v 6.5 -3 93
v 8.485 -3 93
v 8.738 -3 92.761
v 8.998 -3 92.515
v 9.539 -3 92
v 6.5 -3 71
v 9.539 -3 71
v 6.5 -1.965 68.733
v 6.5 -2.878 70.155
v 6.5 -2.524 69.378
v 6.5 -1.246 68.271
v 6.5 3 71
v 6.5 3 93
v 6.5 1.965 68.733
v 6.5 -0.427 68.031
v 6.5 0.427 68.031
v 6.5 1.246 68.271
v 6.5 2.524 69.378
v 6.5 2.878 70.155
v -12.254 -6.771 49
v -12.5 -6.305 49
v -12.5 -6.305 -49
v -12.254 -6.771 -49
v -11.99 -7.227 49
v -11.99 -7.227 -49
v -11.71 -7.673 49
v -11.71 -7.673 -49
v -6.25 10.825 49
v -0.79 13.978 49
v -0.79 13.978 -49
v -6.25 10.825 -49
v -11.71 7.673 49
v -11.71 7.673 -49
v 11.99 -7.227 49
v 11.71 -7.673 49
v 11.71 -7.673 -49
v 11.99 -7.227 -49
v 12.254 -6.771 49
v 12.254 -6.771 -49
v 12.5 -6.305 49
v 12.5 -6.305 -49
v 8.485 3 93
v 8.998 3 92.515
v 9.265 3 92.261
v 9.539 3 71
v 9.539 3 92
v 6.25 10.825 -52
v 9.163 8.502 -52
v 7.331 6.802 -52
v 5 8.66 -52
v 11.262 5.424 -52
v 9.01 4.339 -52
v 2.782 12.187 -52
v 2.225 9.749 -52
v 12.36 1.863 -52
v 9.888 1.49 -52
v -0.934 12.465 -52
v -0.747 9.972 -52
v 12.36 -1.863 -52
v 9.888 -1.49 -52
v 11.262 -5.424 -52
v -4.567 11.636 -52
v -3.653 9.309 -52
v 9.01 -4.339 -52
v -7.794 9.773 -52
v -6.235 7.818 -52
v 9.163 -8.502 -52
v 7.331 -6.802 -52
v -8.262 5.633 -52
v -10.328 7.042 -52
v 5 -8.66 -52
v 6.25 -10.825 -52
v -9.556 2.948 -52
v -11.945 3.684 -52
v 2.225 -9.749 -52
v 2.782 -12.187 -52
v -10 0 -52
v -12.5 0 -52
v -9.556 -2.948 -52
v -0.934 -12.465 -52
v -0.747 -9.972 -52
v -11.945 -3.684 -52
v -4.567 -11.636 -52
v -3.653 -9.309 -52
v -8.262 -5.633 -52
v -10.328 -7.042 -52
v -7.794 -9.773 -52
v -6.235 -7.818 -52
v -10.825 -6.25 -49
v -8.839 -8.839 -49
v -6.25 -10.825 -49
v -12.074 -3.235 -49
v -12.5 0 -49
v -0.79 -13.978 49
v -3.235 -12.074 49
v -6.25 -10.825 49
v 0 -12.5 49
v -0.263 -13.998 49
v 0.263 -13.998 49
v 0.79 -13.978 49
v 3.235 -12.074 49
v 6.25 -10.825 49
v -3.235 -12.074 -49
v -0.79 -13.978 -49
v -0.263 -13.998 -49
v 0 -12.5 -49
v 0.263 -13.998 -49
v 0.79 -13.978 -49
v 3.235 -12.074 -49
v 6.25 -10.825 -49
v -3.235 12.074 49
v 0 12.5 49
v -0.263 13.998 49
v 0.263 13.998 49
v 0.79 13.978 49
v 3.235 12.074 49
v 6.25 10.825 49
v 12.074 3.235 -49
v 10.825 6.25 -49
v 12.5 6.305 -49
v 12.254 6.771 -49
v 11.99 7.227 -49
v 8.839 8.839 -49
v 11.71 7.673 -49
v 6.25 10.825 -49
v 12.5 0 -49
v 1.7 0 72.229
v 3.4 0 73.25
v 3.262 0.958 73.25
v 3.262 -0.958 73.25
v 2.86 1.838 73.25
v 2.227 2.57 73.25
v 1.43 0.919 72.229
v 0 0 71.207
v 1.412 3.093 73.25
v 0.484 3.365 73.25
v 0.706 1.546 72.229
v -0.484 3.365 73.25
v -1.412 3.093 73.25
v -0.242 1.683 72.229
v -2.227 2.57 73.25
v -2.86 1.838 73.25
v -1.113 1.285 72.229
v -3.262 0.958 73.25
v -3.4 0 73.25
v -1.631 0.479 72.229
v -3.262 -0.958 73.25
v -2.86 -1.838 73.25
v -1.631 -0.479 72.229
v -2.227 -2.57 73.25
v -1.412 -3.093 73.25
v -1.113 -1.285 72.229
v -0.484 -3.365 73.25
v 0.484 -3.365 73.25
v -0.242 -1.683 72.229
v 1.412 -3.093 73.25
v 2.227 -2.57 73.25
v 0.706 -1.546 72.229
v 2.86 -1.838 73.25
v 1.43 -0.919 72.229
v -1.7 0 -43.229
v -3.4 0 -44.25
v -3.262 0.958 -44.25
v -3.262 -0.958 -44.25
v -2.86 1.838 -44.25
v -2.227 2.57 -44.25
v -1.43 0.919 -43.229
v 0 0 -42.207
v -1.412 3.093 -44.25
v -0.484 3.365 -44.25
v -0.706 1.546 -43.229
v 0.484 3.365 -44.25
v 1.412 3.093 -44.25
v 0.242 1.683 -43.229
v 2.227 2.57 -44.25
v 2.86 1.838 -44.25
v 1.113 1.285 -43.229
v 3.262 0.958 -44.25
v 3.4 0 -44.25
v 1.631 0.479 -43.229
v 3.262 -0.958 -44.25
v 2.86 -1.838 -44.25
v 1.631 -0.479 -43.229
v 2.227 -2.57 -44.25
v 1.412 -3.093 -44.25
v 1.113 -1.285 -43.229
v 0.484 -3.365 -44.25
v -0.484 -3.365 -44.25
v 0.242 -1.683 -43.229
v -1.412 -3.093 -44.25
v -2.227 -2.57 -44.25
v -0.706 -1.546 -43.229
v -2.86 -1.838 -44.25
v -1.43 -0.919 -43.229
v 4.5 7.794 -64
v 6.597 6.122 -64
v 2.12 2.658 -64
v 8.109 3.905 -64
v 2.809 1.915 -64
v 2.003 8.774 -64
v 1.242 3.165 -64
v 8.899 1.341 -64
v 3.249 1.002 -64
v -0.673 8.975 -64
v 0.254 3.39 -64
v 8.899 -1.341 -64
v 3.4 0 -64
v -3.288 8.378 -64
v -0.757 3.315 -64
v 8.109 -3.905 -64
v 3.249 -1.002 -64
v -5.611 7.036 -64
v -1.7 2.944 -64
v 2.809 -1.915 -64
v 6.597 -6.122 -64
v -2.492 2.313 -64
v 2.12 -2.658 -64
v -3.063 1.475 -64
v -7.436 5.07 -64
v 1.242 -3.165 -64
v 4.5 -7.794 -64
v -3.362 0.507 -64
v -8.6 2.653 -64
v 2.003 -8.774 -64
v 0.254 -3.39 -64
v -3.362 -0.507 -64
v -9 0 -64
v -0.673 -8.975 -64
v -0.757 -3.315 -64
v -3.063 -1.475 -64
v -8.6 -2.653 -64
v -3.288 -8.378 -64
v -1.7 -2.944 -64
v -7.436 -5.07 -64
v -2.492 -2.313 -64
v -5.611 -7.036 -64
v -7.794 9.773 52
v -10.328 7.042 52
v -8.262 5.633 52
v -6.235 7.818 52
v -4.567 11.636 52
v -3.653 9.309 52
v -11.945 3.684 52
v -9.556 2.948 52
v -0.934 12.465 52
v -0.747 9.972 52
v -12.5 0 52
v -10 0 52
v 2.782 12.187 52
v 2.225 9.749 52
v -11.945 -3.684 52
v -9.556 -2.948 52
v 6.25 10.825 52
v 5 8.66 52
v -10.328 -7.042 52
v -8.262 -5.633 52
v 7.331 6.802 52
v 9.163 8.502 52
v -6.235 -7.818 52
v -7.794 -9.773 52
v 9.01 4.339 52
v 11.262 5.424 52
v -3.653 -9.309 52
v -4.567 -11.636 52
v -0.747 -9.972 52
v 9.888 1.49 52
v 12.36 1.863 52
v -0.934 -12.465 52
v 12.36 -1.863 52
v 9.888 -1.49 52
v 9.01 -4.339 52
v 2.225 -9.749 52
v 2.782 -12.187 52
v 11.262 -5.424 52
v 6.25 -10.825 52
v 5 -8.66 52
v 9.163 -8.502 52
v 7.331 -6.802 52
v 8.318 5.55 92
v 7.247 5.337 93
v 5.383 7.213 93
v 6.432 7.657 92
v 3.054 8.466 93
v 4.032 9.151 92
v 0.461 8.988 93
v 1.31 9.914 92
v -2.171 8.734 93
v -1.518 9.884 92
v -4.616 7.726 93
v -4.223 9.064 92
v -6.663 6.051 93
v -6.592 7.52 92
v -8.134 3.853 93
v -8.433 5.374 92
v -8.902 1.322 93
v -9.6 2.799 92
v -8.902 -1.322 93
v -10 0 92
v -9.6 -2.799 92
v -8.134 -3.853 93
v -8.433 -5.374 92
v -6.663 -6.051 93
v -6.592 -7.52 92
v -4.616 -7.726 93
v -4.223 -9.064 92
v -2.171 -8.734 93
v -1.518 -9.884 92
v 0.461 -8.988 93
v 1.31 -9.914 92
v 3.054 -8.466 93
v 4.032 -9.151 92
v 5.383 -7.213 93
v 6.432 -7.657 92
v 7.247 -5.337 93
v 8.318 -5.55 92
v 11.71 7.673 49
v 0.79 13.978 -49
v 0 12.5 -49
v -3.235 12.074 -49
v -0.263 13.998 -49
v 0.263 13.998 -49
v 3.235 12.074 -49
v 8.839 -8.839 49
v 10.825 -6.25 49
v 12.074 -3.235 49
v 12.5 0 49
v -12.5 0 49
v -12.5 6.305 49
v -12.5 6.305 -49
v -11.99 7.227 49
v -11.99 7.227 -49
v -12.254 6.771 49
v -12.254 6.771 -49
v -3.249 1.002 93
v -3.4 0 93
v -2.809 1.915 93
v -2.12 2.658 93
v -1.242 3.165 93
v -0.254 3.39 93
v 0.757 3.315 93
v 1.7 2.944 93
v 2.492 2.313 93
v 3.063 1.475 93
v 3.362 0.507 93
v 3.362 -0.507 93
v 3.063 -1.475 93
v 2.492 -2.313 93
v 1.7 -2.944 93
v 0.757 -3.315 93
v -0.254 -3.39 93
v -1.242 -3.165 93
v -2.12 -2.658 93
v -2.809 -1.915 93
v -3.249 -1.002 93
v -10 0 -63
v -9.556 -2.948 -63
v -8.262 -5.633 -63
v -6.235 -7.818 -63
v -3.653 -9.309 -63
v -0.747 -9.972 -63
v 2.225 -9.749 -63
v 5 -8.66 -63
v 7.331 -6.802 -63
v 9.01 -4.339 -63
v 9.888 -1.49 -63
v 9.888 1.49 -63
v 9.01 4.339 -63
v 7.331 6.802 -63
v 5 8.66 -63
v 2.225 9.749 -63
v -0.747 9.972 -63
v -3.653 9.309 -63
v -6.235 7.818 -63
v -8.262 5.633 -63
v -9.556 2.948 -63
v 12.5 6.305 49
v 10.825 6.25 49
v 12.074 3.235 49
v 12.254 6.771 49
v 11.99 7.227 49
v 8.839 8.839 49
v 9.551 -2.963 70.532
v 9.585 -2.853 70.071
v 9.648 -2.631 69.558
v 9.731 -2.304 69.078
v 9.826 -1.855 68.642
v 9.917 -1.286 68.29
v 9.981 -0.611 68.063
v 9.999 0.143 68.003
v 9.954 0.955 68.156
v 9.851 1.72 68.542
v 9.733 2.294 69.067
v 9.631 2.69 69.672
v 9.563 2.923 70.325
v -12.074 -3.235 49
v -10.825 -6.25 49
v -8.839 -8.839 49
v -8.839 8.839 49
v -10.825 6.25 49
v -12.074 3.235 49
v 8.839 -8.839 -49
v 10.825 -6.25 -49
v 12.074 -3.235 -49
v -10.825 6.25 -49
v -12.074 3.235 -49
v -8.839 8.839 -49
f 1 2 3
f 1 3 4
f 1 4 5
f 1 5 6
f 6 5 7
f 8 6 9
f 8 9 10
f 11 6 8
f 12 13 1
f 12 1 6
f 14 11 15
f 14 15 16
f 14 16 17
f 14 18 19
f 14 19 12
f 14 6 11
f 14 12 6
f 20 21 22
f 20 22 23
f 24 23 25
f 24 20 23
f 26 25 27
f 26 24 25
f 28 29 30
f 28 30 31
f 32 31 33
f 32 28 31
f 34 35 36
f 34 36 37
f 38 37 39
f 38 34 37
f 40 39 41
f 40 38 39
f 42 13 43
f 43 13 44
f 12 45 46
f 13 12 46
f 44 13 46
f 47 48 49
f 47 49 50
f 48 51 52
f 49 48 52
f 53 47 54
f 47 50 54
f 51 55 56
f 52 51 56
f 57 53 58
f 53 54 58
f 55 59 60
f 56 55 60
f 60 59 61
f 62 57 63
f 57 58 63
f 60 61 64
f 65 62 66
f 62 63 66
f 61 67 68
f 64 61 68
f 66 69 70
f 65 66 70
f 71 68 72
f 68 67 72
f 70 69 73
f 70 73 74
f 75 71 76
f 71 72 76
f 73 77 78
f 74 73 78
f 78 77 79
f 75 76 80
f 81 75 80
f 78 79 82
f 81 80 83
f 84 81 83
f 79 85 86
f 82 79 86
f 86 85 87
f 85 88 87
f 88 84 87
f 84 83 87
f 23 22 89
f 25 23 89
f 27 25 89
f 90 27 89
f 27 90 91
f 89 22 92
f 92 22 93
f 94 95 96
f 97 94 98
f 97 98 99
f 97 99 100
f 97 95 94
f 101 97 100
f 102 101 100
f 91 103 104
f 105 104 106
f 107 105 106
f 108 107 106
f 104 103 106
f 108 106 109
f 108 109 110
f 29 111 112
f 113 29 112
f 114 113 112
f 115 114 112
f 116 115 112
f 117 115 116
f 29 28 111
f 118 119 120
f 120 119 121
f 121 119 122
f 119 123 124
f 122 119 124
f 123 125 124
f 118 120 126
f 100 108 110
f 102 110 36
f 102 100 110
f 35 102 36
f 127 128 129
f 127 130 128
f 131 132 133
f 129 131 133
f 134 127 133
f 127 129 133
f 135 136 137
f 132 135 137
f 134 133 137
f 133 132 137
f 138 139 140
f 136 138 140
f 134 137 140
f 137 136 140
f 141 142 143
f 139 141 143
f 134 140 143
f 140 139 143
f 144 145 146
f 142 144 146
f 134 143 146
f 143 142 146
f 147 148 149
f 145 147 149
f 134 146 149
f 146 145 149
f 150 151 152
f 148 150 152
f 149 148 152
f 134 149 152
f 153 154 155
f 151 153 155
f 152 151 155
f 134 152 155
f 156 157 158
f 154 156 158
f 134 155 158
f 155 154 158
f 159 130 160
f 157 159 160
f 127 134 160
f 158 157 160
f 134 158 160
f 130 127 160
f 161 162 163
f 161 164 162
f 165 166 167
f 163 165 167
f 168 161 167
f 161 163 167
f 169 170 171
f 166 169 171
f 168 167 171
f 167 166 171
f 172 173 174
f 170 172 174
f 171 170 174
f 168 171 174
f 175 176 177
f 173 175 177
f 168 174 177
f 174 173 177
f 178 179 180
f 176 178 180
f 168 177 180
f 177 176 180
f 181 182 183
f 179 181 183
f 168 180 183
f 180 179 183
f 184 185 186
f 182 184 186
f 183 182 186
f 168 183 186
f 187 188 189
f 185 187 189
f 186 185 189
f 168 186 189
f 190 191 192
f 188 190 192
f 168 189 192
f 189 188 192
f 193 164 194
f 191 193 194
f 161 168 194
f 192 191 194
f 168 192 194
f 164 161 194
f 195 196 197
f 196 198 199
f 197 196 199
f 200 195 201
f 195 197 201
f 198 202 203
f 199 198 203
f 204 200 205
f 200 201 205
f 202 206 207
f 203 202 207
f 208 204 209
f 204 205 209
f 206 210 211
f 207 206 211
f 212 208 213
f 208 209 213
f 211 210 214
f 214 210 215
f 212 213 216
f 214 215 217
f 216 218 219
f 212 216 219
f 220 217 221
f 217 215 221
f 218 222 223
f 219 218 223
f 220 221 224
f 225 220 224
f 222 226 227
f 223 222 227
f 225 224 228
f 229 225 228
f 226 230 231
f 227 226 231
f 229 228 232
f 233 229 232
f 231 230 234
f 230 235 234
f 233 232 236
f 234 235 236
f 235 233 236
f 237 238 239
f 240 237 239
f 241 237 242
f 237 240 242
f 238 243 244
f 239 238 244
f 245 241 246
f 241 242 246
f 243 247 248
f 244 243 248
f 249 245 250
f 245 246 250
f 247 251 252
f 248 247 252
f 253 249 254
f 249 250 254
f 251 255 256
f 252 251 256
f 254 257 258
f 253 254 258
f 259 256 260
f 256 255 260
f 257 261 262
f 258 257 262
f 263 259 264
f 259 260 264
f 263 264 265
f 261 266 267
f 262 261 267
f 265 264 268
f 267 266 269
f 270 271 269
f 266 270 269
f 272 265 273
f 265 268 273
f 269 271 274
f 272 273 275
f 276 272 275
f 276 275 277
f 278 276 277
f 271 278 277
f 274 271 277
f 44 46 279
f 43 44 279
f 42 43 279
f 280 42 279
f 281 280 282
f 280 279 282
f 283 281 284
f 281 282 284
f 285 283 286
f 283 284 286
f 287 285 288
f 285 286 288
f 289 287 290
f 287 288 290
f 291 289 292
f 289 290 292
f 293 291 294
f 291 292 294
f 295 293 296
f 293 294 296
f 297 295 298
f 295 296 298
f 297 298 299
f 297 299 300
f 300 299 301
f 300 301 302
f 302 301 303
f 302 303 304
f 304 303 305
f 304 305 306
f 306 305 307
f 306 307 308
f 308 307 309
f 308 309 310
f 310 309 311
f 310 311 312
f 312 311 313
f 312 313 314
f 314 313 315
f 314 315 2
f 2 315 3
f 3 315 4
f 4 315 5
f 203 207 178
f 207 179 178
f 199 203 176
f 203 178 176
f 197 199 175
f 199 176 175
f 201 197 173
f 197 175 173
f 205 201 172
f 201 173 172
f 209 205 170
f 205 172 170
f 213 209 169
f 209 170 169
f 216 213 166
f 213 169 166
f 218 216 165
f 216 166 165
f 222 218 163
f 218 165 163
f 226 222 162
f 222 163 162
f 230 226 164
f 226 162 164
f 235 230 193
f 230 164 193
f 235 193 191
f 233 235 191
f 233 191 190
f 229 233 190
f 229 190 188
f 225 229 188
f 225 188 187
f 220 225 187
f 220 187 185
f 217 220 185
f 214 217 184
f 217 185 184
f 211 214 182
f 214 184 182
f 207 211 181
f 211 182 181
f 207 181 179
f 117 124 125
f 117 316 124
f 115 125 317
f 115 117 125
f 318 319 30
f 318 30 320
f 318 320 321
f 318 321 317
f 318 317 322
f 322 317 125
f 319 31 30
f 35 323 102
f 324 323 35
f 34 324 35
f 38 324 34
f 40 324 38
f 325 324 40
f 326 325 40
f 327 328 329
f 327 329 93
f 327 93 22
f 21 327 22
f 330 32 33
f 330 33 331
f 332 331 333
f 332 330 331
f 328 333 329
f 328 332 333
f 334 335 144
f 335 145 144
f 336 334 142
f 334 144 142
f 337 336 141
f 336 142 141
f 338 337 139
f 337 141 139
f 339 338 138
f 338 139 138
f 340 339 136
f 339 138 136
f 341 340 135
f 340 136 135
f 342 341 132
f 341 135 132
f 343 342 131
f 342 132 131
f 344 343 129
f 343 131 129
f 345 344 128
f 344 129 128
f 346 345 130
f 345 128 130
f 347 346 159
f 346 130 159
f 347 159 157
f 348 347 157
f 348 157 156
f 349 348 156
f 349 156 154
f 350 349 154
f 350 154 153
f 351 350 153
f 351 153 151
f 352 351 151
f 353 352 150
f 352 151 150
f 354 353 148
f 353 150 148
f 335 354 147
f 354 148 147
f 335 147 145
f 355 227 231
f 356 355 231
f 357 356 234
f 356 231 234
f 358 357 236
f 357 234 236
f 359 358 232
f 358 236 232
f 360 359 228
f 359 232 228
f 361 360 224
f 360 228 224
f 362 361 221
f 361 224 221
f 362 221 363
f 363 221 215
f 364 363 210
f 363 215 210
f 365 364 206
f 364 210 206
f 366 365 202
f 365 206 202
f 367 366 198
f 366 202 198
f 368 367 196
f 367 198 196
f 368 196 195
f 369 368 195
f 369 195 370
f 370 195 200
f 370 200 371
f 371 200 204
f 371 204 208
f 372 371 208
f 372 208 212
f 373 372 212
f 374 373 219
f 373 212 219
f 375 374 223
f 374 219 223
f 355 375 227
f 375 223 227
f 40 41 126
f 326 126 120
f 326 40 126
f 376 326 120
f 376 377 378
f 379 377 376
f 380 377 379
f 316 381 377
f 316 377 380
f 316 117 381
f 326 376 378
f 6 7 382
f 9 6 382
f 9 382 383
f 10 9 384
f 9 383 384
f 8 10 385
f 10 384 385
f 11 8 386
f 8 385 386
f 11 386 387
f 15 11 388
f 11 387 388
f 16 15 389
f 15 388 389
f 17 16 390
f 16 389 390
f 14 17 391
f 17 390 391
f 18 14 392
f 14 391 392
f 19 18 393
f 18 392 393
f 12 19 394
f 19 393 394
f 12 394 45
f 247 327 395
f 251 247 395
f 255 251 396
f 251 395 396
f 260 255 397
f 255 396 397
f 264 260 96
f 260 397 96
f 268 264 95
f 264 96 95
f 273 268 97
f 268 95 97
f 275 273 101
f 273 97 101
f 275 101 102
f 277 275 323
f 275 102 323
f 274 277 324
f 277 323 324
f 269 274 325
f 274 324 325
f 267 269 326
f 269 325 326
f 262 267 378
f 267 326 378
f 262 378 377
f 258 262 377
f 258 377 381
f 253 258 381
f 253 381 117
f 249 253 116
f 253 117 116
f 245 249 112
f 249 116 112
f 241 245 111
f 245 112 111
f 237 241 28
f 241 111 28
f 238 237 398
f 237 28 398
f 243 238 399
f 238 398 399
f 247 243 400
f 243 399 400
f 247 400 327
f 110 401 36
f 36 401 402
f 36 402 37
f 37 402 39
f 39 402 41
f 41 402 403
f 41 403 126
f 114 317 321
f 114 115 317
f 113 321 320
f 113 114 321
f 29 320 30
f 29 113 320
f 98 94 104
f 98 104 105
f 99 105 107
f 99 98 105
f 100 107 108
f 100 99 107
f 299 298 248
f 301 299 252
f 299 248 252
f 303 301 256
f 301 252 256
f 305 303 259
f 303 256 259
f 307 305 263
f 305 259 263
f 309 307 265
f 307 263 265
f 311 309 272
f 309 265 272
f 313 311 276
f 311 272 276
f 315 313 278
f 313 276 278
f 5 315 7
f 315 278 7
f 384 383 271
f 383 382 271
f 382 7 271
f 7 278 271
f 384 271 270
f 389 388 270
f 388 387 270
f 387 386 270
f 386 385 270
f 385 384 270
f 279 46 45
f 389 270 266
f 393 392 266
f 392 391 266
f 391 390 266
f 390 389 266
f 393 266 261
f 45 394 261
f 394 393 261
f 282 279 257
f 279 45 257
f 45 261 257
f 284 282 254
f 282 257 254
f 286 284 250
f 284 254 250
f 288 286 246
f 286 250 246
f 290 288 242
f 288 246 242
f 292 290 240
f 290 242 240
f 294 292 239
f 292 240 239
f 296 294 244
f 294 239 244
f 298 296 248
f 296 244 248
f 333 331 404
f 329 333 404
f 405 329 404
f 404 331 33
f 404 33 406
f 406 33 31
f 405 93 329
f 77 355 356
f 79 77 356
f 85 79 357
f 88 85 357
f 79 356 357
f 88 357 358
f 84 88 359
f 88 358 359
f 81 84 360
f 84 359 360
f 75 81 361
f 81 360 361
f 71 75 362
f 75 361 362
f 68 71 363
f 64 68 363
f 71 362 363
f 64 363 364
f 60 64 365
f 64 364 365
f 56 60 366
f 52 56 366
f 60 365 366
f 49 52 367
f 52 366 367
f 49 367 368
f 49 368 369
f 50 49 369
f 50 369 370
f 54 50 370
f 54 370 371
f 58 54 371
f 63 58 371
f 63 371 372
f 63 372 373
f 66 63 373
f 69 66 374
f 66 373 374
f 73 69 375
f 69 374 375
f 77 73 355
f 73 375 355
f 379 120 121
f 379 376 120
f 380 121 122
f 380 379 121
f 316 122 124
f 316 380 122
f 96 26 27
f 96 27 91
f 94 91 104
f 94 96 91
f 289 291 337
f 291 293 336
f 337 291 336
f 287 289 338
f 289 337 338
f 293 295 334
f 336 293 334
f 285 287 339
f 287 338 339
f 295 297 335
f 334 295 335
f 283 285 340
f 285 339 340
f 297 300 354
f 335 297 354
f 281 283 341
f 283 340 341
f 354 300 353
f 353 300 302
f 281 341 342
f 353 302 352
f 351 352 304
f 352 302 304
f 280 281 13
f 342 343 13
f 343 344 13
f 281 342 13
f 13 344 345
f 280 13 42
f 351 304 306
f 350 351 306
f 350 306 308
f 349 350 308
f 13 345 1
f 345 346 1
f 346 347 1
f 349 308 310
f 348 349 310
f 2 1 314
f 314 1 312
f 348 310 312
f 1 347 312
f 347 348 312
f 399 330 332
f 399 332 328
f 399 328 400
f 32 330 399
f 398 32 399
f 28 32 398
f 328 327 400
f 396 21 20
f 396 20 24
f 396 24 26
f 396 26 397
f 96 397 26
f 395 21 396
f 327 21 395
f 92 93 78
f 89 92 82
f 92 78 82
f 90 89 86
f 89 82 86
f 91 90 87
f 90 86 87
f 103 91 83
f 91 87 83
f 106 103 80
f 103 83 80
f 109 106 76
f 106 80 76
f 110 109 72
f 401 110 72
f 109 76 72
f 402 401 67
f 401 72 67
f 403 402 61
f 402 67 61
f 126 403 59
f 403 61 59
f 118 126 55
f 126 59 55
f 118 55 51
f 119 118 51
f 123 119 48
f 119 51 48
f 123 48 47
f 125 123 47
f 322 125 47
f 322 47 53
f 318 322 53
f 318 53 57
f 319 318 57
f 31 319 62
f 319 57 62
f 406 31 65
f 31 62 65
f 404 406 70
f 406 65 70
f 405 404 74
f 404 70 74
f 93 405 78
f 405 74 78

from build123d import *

# Parameters (mm, degrees)
BOSS_EXTRUDE1_DEPTH             = 49
CHAMFER1_SIZE                   = 1
M8_TAPPED_HOLE1_D               = 6.8
M8_TAPPED_HOLE1_DEPTH           = 19.75
M8_TAPPED_HOLE1_TIP             = 2.042926105
M8_TAPPED_HOLE1_ON_FACE_2_D     = 6.8
M8_TAPPED_HOLE1_ON_FACE_2_DEPTH = 19.75
M8_TAPPED_HOLE1_ON_FACE_2_TIP   = 2.042926105
CUT_EXTRUDE1_START              = 10
CUT_EXTRUDE1_DEPTH              = 3.5


with BuildPart() as part:
    # Sketch1 → Boss-Extrude1 (new, symmetric)
    with BuildSketch(Plane.XY):
        with BuildLine():
            ThreePointArc((0.789917583, 13.977697601), (0, 14), (-0.789917583, 13.977697601))
            Line((-0.789917583, 13.977697601), (-11.710082417, 7.672937494))
            ThreePointArc((-11.710082417, 7.672937494), (-12.124355653, 7), (-12.5, 6.304760106))
            Line((-12.5, 6.304760106), (-12.5, -6.304760106))
            ThreePointArc((-12.5, -6.304760106), (-12.124355653, -7), (-11.710082417, -7.672937494))
            Line((-11.710082417, -7.672937494), (-0.789917583, -13.977697601))
            ThreePointArc((-0.789917583, -13.977697601), (0, -14), (0.789917583, -13.977697601))
            Line((0.789917583, -13.977697601), (11.710082417, -7.672937494))
            ThreePointArc((11.710082417, -7.672937494), (12.124355653, -7), (12.5, -6.304760106))
            Line((12.5, -6.304760106), (12.5, 6.304760106))
            ThreePointArc((12.5, 6.304760106), (12.124355653, 7), (11.710082417, 7.672937494))
            Line((11.710082417, 7.672937494), (0.789917583, 13.977697601))
        make_face()
    extrude(amount=BOSS_EXTRUDE1_DEPTH, both=True)

    # Sketch2 → Revolve1 (revolve)
    with BuildSketch(Plane(origin=(0, 0, 0), x_dir=(0, 0, -1), z_dir=(1, 0, 0)), mode=Mode.PRIVATE) as revolve1_sk:
        Polygon((-93, 0), (-93, 10), (-52, 10), (-52, 12.5), (-49, 12.5), (-49, 0), align=None)
        Polygon((52, 10), (64, 10), (64, 0), (49, 0), (49, 12.5), (52, 12.5), align=None)
    revolve(revolve1_sk.sketch.rotate(Axis((0, 0, -70.752525622), (0, 0, 1)), 90), axis=Axis((0, 0, -70.752525622), (0, 0, 1)))

    # Chamfer1
    chamfer1_edges = [part.edges().sort_by_distance(p)[0] for p in [
        (10, 0, 93),
        (10, 0, -64),
    ]]
    chamfer(chamfer1_edges, length=CHAMFER1_SIZE)

    # M8 Tapped Hole1
    with Locations(Plane.XY.offset(93)):
        with Locations((0, 0)):
            Hole(M8_TAPPED_HOLE1_D / 2, depth=M8_TAPPED_HOLE1_DEPTH)
            with Locations((0, 0, -(M8_TAPPED_HOLE1_DEPTH + M8_TAPPED_HOLE1_TIP / 2))):  # 118° drill point
                Cone(0, M8_TAPPED_HOLE1_D / 2, M8_TAPPED_HOLE1_TIP, mode=Mode.SUBTRACT)

    # M8 Tapped Hole1 on face 2
    with Locations(Plane(origin=(0, 0, -64), x_dir=(-1, 0, 0), z_dir=(0, 0, -1))):
        with Locations((0, 0)):
            Hole(M8_TAPPED_HOLE1_ON_FACE_2_D / 2, depth=M8_TAPPED_HOLE1_ON_FACE_2_DEPTH)
            with Locations((0, 0, -(M8_TAPPED_HOLE1_ON_FACE_2_DEPTH + M8_TAPPED_HOLE1_ON_FACE_2_TIP / 2))):  # 118° drill point
                Cone(0, M8_TAPPED_HOLE1_ON_FACE_2_D / 2, M8_TAPPED_HOLE1_ON_FACE_2_TIP, mode=Mode.SUBTRACT)

    # Sketch4 → Cut-Extrude1 (cut)
    with BuildSketch(Plane(origin=(0, 0, 0), x_dir=(0, 0, -1), z_dir=(1, 0, 0)).offset(CUT_EXTRUDE1_START)):
        with BuildLine():
            Line((-93, -3), (-71, -3))
            ThreePointArc((-71, -3), (-68, 0), (-71, 3))
            Line((-71, 3), (-93, 3))
            ThreePointArc((-93, 3), (-96, 0), (-93, -3))
        make_face()
    extrude(amount=-CUT_EXTRUDE1_DEPTH, mode=Mode.SUBTRACT)


solid = part.part
